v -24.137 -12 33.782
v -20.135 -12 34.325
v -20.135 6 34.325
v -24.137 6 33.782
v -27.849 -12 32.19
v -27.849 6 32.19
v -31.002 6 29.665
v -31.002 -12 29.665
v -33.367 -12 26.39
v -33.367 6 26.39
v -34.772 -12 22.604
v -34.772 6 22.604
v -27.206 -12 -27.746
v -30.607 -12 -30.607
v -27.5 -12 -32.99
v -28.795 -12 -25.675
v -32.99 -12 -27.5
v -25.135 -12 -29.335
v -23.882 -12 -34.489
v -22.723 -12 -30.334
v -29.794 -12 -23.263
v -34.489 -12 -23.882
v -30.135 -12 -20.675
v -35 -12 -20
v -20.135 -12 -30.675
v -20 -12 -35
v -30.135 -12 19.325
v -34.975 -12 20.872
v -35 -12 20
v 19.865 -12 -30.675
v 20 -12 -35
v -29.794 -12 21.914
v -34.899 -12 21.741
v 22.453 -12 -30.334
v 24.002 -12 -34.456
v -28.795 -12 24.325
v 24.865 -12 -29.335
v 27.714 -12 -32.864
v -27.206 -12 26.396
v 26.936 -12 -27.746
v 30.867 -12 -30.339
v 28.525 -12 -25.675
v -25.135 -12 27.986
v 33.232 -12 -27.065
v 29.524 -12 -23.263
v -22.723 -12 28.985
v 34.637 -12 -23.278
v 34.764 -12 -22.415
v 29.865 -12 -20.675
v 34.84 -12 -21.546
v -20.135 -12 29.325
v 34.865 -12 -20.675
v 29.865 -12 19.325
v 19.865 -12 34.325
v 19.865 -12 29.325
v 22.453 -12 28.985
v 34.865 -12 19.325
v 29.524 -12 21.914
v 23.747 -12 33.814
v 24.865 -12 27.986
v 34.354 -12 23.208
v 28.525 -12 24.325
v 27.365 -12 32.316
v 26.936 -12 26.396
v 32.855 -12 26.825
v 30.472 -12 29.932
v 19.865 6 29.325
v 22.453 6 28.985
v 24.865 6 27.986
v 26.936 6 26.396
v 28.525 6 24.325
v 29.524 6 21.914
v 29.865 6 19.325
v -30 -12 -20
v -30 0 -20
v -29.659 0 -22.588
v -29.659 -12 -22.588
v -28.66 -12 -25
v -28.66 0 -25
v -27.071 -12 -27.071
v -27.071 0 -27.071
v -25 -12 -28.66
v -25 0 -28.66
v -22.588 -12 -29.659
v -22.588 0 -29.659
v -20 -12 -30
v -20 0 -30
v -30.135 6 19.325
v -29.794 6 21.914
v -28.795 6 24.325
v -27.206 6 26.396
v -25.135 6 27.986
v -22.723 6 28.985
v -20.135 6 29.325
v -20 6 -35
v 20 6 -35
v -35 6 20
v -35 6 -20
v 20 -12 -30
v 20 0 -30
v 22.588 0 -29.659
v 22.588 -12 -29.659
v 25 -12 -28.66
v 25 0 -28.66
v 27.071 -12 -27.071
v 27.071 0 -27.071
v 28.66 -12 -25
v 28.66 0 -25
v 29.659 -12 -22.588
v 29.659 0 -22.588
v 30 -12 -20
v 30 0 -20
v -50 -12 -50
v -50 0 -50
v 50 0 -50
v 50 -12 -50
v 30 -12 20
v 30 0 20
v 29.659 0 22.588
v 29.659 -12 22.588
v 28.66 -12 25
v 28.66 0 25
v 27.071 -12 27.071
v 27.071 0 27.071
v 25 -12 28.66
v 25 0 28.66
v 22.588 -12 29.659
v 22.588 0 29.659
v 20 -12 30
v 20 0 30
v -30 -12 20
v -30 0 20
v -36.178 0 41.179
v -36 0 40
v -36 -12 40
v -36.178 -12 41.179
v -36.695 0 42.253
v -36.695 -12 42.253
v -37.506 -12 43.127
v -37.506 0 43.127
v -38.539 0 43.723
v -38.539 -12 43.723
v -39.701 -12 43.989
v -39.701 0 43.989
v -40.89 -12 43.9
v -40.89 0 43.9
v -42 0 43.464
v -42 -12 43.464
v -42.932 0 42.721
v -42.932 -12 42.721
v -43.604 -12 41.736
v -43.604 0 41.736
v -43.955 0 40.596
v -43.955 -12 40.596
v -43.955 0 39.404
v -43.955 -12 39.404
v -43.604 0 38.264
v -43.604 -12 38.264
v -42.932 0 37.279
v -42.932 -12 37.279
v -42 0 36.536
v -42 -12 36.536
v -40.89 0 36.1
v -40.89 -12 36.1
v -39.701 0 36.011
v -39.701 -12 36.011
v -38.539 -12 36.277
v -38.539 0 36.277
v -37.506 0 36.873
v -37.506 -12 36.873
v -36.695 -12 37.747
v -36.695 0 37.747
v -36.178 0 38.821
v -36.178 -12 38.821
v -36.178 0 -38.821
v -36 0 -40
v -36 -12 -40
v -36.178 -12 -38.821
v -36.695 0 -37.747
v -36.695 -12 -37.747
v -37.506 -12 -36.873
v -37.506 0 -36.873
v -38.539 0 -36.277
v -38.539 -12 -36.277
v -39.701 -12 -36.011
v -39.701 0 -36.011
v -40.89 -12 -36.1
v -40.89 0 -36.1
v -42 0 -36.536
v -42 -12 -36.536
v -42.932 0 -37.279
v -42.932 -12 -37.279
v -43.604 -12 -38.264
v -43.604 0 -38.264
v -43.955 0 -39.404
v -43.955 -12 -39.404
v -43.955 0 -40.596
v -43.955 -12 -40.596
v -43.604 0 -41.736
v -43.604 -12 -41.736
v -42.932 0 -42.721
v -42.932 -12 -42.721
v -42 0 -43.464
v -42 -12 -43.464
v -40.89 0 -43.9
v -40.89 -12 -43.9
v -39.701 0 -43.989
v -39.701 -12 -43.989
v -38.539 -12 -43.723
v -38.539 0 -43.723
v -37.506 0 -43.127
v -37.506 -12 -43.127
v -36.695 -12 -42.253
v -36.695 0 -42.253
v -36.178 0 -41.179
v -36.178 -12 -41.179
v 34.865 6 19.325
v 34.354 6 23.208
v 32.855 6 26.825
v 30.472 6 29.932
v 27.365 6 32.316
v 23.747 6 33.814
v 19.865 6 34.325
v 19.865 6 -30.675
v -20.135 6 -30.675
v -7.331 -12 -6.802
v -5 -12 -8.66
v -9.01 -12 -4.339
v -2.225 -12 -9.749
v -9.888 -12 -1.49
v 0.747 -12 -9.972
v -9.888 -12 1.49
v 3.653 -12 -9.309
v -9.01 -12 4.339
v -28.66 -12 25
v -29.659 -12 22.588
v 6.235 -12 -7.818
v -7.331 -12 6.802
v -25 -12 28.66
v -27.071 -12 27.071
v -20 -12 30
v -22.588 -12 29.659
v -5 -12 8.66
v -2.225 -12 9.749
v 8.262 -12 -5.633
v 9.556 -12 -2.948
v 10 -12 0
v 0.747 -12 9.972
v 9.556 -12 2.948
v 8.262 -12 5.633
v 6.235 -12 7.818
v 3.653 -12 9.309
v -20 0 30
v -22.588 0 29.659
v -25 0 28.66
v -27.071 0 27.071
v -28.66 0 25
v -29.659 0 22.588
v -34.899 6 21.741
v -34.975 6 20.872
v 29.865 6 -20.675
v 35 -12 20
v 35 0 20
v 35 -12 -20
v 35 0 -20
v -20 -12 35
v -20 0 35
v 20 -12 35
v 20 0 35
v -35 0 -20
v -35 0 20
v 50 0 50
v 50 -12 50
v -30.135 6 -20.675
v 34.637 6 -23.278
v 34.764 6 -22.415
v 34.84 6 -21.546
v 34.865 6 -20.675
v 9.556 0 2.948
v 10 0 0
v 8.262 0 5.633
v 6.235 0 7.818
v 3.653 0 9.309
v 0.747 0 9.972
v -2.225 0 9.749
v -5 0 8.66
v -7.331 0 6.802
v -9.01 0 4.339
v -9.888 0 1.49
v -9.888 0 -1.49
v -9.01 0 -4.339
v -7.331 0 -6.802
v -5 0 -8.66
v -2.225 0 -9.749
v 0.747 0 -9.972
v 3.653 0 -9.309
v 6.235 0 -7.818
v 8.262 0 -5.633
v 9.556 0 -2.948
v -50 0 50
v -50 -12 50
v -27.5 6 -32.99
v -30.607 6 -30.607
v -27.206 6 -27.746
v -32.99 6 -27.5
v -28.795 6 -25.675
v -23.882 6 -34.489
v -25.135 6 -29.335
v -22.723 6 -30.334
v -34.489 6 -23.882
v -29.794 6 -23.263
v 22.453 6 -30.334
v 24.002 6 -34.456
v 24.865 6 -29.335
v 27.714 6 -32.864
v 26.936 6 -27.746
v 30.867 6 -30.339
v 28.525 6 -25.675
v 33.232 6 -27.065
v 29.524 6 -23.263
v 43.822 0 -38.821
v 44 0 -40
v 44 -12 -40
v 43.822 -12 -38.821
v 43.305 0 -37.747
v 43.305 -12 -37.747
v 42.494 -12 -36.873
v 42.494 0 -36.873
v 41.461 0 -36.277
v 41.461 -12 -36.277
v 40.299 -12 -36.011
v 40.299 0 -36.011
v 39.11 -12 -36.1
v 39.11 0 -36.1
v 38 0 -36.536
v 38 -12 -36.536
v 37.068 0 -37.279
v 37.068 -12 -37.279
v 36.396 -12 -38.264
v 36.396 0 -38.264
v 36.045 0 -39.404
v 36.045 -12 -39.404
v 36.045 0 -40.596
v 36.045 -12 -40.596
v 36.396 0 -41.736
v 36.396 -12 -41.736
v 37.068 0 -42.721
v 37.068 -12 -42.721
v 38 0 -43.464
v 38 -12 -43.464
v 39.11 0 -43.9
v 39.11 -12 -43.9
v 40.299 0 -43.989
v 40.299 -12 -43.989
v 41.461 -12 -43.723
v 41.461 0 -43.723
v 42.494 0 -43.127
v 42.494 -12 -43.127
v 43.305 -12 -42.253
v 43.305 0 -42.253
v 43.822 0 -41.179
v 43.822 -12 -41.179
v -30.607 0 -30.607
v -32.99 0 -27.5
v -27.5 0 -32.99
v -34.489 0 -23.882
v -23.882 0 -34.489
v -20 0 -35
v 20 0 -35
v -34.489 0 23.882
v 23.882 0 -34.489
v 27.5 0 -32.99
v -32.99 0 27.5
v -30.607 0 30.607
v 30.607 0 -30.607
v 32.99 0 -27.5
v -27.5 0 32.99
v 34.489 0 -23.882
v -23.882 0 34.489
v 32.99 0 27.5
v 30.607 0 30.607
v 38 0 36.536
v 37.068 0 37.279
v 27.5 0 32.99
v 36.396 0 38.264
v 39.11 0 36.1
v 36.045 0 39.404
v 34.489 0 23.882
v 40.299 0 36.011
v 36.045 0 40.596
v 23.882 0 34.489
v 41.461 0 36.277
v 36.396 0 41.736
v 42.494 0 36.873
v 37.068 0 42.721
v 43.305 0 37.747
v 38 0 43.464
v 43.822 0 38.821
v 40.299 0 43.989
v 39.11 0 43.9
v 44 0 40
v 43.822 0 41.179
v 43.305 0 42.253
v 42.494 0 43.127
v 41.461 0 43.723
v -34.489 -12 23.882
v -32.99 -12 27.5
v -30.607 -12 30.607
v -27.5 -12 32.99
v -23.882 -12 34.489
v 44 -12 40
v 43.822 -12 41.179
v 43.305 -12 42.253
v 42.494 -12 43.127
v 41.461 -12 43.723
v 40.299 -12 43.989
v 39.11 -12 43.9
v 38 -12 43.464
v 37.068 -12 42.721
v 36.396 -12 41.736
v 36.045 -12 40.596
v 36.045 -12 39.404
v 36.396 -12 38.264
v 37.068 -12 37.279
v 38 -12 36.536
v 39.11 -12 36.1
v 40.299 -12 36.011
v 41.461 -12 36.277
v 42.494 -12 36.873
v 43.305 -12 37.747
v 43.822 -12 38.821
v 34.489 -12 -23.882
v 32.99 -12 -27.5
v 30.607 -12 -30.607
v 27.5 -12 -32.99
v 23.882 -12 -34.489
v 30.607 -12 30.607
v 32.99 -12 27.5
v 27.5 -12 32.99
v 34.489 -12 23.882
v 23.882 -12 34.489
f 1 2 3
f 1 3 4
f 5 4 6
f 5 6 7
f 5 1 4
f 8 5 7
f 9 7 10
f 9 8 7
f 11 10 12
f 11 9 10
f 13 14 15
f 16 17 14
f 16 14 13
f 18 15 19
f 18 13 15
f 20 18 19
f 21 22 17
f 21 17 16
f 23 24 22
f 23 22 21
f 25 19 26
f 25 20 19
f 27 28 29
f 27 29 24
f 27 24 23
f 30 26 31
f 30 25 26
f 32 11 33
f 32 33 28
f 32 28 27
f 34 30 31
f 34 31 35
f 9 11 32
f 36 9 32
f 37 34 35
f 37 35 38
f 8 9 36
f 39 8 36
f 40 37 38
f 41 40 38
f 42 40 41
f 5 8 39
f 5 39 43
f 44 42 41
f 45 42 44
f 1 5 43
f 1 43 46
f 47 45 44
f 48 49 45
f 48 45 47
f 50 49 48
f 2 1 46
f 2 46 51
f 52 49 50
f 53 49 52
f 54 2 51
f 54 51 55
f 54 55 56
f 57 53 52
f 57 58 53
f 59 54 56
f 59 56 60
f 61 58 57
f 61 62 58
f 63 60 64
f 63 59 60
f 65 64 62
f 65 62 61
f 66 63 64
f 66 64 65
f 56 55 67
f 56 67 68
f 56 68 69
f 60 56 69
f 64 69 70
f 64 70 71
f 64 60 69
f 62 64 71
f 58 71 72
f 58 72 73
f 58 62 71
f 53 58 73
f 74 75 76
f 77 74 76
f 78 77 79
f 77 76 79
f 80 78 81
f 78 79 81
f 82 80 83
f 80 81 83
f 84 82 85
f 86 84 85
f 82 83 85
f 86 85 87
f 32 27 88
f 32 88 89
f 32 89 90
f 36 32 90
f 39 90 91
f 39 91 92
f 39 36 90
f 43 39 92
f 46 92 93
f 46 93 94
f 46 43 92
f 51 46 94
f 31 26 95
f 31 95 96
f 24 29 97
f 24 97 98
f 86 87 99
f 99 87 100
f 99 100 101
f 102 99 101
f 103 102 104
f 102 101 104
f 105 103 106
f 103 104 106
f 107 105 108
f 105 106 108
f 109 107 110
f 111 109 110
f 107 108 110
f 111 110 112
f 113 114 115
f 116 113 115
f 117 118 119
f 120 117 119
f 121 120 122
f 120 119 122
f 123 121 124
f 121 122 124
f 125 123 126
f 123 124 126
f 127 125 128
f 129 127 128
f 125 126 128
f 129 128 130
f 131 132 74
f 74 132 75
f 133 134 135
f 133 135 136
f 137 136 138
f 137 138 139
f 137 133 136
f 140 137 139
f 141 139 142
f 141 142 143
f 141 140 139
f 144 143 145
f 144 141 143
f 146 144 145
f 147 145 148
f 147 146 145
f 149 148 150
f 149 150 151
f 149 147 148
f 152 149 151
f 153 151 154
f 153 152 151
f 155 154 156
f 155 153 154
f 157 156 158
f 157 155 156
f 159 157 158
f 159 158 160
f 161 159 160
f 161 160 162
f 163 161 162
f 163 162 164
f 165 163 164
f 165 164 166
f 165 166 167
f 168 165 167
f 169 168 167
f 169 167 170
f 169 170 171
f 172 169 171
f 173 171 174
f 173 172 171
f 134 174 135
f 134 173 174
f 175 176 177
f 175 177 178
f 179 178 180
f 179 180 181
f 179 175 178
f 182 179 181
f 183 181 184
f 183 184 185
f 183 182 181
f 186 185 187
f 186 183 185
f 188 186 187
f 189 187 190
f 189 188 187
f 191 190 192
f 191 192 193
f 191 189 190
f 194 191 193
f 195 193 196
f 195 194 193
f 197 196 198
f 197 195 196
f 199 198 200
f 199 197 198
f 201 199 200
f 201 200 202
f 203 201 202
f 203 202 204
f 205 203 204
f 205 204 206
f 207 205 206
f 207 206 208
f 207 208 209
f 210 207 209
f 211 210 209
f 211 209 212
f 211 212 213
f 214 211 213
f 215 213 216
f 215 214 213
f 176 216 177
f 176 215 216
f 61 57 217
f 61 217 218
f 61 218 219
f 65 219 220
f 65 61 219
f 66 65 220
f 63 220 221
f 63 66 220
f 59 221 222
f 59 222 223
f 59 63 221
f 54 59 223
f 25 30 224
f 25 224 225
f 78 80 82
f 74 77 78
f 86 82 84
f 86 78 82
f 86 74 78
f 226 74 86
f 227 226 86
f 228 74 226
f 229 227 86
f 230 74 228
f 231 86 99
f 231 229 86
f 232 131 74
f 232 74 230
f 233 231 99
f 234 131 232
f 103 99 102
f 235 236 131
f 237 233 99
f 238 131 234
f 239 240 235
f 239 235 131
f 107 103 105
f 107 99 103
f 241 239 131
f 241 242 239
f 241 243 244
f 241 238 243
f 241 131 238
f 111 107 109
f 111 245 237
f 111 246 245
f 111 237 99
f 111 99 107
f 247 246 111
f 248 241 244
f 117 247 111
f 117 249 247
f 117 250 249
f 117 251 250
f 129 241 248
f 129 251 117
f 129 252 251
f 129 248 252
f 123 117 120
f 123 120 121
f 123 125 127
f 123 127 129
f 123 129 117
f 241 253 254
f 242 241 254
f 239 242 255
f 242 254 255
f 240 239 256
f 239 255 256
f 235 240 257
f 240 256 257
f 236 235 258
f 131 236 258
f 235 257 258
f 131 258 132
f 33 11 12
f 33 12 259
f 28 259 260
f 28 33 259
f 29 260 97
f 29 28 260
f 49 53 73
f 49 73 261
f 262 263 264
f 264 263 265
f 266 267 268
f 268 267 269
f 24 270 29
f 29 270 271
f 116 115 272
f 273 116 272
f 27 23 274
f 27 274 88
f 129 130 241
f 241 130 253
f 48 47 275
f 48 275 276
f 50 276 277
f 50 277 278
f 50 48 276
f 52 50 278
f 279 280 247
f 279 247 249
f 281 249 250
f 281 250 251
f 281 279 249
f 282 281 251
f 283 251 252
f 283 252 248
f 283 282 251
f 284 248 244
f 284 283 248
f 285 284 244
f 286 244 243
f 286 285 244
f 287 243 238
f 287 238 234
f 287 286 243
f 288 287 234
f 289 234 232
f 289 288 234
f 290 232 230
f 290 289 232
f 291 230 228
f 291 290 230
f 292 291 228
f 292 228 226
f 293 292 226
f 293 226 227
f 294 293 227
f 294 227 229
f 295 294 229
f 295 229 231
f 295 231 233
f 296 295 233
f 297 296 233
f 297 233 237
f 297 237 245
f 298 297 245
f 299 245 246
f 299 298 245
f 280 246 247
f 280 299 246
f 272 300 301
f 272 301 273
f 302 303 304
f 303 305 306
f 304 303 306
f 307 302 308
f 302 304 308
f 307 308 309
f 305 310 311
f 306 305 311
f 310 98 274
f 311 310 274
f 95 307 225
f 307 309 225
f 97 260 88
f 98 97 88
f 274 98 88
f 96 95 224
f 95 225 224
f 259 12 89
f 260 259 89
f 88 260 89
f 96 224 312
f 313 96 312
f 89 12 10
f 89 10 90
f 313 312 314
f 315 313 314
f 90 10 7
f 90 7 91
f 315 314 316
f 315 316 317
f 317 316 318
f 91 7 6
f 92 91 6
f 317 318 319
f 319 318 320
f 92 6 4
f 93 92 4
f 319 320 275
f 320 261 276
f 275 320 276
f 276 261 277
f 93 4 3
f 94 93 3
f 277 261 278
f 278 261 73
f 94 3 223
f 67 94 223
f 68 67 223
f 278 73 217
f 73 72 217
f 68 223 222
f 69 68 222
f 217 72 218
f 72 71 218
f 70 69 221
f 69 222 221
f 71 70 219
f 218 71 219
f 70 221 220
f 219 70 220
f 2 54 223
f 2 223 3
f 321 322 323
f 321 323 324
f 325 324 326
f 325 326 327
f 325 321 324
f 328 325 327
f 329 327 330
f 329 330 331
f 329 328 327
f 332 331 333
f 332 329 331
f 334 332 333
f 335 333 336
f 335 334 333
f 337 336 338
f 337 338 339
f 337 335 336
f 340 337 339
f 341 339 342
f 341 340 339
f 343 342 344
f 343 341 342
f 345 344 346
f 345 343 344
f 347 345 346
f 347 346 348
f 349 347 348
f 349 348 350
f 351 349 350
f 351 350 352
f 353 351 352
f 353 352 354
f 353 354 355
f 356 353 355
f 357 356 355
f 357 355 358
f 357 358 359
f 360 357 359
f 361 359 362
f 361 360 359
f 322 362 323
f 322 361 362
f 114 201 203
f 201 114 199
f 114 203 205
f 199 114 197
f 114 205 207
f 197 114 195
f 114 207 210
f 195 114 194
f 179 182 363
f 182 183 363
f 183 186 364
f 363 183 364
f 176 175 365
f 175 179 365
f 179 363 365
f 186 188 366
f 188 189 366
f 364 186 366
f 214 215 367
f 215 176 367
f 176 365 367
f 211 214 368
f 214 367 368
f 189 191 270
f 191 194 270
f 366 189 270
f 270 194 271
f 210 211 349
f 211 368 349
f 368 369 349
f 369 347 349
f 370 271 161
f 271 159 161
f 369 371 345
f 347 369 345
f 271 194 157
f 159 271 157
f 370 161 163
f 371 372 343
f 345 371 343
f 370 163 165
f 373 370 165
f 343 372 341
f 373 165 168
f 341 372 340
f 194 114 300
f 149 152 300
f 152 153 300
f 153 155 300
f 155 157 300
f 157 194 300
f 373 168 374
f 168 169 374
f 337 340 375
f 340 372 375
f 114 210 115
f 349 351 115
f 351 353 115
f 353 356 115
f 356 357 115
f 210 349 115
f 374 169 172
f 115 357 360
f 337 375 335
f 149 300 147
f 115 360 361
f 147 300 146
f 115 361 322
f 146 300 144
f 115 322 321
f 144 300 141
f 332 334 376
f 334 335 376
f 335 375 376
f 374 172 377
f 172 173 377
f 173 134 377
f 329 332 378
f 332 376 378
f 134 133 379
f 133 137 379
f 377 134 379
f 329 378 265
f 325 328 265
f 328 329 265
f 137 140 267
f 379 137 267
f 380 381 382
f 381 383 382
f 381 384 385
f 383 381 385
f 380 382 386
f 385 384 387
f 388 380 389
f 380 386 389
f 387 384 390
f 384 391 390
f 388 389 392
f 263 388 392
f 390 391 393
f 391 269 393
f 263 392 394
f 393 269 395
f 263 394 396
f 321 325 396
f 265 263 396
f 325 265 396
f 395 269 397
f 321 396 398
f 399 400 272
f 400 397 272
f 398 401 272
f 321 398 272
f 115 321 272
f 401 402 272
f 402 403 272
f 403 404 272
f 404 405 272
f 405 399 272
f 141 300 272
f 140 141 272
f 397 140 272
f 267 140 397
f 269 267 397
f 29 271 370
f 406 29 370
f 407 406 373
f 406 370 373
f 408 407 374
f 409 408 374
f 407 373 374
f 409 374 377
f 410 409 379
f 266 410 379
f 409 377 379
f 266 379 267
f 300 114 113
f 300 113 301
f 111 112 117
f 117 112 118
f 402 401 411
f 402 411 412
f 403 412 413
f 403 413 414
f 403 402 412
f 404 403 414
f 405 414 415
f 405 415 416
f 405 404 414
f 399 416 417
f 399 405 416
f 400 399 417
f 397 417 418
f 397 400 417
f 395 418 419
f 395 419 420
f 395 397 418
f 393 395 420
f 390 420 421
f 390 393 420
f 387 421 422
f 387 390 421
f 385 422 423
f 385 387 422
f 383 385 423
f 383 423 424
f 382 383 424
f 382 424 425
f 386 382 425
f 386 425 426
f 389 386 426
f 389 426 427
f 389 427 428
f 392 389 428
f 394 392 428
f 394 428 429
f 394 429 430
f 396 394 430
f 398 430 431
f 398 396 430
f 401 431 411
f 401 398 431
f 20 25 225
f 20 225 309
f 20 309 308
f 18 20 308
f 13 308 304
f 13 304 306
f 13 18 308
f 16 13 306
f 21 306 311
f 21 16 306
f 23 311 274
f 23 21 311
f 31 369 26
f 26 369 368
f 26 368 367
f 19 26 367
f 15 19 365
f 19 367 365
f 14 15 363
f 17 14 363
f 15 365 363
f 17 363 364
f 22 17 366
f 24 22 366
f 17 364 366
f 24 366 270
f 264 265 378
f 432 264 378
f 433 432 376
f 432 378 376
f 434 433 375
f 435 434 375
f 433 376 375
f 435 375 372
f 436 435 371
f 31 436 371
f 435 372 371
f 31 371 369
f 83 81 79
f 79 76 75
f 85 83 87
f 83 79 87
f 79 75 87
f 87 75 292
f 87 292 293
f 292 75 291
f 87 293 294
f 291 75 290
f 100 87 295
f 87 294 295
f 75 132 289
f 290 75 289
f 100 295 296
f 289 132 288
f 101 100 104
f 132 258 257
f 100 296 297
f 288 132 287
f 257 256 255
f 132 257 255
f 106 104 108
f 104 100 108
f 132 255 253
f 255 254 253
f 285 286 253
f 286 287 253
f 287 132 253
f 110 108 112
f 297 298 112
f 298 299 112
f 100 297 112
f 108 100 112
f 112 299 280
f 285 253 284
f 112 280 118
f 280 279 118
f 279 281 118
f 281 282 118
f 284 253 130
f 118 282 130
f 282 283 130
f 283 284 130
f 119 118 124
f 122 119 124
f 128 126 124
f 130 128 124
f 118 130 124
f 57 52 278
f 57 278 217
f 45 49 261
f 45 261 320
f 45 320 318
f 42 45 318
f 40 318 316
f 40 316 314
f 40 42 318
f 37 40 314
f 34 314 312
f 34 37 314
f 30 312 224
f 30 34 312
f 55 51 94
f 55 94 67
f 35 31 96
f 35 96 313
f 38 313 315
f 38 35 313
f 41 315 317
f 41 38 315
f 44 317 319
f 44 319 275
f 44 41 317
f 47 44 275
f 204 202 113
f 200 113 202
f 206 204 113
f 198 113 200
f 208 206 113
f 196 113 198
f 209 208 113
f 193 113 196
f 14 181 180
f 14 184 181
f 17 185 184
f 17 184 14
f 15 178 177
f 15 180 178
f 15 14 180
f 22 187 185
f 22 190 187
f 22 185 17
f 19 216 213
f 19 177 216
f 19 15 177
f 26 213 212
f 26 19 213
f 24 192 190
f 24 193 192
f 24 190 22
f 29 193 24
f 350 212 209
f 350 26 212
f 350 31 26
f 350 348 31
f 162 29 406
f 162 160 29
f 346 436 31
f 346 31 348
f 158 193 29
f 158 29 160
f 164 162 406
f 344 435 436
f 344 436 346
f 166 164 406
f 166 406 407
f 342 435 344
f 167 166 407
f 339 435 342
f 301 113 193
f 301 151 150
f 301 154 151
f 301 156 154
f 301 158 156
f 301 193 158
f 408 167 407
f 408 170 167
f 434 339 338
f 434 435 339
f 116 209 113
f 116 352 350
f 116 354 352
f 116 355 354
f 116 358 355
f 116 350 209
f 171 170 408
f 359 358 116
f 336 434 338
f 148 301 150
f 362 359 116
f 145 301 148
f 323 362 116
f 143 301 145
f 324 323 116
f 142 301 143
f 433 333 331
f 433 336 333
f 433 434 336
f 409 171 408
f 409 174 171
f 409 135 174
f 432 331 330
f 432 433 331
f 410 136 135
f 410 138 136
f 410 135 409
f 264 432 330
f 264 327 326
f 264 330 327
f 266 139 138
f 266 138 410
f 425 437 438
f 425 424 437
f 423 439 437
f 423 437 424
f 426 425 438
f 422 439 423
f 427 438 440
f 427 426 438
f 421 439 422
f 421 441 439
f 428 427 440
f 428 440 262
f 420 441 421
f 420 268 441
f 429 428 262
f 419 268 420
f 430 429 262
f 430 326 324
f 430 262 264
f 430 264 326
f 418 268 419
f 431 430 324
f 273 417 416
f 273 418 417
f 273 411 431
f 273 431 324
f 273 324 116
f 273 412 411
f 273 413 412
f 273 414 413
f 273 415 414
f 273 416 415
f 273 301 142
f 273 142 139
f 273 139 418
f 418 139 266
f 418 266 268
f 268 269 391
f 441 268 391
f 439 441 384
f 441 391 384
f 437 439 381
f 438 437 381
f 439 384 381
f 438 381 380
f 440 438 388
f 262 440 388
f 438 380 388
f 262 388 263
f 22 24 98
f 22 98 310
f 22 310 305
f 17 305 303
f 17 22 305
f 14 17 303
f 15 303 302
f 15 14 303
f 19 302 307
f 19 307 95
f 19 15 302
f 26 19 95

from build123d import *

# Parameters (mm, degrees)
F0_R     = 10
F1_DEPTH = 12
F0_W     = 100
F0_H     = 100
F0_R_2   = 4
F3_DEPTH = 18


with BuildPart() as f1:
    # F0 (on Front) → F1 (new body)
    with BuildSketch(Plane.XZ):
        with BuildLine():
            Line((-20, -30), (20, -30))
            ThreePointArc((20, -30), (27.0710678119, -27.0710678119), (30, -20))
            Line((30, -20), (30, 20))
            ThreePointArc((30, 20), (27.0710678119, 27.0710678119), (20, 30))
            Line((20, 30), (-20, 30))
            ThreePointArc((-20, 30), (-27.0710678119, 27.0710678119), (-30, 20))
            Line((-30, 20), (-30, -20))
            ThreePointArc((-30, -20), (-27.0710678119, -27.0710678119), (-20, -30))
        make_face()
        Circle(F0_R, mode=Mode.SUBTRACT)
    extrude(amount=F1_DEPTH)


with BuildPart() as f1b:
    # F0 (on Front) → F1, piece 2 (new body)
    with BuildSketch(Plane.XZ):
        Rectangle(F0_W, F0_H)
        with Locations((-40, -40)):
            Circle(F0_R_2, mode=Mode.SUBTRACT)
        with Locations((40, -40)):
            Circle(F0_R_2, mode=Mode.SUBTRACT)
        with Locations((-40, 40)):
            Circle(F0_R_2, mode=Mode.SUBTRACT)
        with BuildLine():
            Line((35, 20), (35, -20))
            ThreePointArc((35, -20), (30.6066017178, -30.6066017178), (20, -35))
            Line((20, -35), (-20, -35))
            ThreePointArc((-20, -35), (-30.6066017178, -30.6066017178), (-35, -20))
            Line((-35, -20), (-35, 20))
            ThreePointArc((-35, 20), (-30.6066017178, 30.6066017178), (-20, 35))
            Line((-20, 35), (20, 35))
            ThreePointArc((20, 35), (30.6066017178, 30.6066017178), (35, 20))
        make_face(mode=Mode.SUBTRACT)
        with Locations((40, 40)):
            Circle(F0_R_2, mode=Mode.SUBTRACT)
    extrude(amount=F1_DEPTH)


with BuildPart() as f3:
    # F2 (on face) → F3 (new body)
    with BuildSketch(Plane.XZ.offset(12)):
        with BuildLine():
            ThreePointArc((34.6373791876, -23.2782816413), (34.8080432822, -21.9814194015), (34.8650758789, -20.6746198051))
            Line((34.8650758789, -20.6746198051), (34.8650758789, 19.3253801949))
            ThreePointArc((34.8650758789, 19.3253801949), (30.4716775967, 29.9319819127), (19.8650758789, 34.3253801949))
            Line((19.8650758789, 34.3253801949), (-20.1349241211, 34.3253801949))
            ThreePointArc((-20.1349241211, 34.3253801949), (-29.5111113894, 31.0338007677), (-34.7723033086, 22.6036618362))
            ThreePointArc((-34.7723033086, 22.6036618362), (-34.9429674033, 21.3067995964), (-35, 20))
            Line((-35, 20), (-35, -20))
            ThreePointArc((-35, -20), (-30.6066017178, -30.6066017178), (-20, -35))
            Line((-20, -35), (20, -35))
            ThreePointArc((20, -35), (29.3761872683, -31.7084205728), (34.6373791876, -23.2782816413))
        make_face()
        with BuildLine():
            ThreePointArc((29.8650758789, -20.6746198051), (26.9361436908, -27.7456876169), (19.8650758789, -30.6746198051))
            Line((19.8650758789, -30.6746198051), (-20.1349241211, -30.6746198051))
            ThreePointArc((-20.1349241211, -30.6746198051), (-27.205991933, -27.7456876169), (-30.1349241211, -20.6746198051))
            Line((-30.1349241211, -20.6746198051), (-30.1349241211, 19.3253801949))
            ThreePointArc((-30.1349241211, 19.3253801949), (-27.205991933, 26.3964480068), (-20.1349241211, 29.3253801949))
            Line((-20.1349241211, 29.3253801949), (19.8650758789, 29.3253801949))
            ThreePointArc((19.8650758789, 29.3253801949), (26.9361436908, 26.3964480068), (29.8650758789, 19.3253801949))
            Line((29.8650758789, 19.3253801949), (29.8650758789, -20.6746198051))
        make_face(mode=Mode.SUBTRACT)
    extrude(amount=-F3_DEPTH)


solid = Compound([f1.part, f1b.part, f3.part])
